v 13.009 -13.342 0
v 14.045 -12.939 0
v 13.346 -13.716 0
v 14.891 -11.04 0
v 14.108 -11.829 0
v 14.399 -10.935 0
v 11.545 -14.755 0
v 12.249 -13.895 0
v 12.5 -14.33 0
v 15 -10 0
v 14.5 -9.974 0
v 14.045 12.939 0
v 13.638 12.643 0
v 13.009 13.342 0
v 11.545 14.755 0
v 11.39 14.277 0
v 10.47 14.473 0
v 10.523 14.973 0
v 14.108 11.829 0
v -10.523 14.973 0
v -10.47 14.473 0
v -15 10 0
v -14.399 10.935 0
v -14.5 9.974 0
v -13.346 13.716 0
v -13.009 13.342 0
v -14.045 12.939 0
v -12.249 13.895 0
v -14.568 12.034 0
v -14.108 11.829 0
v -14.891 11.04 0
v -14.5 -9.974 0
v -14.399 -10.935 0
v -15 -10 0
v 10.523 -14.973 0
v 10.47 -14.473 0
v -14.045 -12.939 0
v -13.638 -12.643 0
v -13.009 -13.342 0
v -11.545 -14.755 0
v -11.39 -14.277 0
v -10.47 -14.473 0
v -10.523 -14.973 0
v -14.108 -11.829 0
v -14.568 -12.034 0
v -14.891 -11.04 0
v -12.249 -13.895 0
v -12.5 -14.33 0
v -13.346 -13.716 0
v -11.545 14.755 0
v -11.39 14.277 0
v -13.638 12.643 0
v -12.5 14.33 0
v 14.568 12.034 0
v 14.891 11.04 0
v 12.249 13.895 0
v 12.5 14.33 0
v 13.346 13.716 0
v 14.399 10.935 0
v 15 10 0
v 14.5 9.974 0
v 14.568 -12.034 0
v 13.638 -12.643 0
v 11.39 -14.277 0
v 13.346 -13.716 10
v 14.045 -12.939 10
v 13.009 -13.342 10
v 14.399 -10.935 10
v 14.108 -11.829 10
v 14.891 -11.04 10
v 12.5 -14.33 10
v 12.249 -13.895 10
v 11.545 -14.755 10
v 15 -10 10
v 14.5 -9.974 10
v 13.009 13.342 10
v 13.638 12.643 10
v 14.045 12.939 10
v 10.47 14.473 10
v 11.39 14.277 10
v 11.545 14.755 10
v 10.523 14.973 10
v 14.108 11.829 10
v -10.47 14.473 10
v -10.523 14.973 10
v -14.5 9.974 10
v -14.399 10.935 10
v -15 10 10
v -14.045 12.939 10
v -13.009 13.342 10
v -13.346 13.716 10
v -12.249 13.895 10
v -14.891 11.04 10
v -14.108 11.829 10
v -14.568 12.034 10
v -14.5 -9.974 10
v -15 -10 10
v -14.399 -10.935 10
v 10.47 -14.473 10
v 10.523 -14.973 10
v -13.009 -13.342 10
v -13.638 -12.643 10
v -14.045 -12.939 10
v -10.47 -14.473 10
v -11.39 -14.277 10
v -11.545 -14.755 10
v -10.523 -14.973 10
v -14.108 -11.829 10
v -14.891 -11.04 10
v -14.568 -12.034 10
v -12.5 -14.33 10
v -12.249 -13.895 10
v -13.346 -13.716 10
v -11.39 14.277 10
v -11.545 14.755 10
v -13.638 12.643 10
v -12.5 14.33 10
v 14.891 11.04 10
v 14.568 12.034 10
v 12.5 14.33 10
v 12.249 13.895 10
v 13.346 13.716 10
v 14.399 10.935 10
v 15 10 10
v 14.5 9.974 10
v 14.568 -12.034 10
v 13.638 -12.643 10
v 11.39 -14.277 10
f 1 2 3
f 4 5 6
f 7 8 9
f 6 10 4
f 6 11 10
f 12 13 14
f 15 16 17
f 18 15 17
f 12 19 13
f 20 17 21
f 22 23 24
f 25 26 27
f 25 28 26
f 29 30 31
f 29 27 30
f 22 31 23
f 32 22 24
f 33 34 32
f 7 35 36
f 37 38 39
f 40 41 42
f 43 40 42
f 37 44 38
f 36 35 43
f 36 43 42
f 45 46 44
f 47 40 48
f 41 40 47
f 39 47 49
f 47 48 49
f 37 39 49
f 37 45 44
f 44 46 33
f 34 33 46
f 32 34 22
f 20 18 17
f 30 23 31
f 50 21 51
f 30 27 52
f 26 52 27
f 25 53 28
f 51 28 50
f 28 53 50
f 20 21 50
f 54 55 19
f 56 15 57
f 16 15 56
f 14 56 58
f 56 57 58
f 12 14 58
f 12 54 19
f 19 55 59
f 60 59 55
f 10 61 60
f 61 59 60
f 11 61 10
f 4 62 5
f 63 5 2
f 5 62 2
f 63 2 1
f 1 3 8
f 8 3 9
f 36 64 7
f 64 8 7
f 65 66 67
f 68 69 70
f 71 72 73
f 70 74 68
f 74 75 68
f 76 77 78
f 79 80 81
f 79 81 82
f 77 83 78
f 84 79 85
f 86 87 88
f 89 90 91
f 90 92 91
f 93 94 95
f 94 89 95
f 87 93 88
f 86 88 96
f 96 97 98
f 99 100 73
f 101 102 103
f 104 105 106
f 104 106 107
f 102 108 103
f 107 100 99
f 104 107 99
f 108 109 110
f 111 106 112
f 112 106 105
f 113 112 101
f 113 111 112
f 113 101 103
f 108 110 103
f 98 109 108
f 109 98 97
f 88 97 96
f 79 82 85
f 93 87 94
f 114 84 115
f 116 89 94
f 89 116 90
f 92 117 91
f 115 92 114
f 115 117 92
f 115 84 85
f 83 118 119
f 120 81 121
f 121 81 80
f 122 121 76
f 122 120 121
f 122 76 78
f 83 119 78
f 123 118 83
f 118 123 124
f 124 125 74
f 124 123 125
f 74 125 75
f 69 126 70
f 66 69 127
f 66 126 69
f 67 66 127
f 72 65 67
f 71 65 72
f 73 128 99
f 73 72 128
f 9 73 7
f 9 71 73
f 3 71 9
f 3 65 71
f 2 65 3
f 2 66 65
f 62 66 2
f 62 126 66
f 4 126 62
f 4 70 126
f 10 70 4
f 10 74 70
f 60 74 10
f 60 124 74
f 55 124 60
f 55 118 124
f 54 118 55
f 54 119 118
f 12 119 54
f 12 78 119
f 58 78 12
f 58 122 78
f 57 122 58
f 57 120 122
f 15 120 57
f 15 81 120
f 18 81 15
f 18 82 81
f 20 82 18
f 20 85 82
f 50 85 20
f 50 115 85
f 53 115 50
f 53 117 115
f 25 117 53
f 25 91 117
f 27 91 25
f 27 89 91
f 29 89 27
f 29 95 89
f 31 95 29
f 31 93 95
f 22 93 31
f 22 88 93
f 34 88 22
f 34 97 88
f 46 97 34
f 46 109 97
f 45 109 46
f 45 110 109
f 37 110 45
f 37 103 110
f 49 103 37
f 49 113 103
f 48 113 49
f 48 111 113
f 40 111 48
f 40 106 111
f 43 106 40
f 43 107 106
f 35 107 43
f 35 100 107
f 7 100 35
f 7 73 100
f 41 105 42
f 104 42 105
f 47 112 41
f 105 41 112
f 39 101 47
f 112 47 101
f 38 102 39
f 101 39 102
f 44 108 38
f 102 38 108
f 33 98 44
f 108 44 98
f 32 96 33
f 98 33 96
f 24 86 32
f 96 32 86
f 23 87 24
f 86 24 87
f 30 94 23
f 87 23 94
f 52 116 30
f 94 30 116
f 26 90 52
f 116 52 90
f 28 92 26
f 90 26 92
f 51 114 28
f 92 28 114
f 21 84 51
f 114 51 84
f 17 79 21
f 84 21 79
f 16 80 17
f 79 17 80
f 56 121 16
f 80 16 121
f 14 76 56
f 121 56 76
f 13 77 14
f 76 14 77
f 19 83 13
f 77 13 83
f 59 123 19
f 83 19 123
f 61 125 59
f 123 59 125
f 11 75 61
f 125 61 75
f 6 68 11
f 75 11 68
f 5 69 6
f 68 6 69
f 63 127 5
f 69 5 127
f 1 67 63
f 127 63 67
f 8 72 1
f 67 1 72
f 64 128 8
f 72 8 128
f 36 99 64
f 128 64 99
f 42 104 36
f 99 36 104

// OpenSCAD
// Everything is in mm.
size = 30;
height = 10;
thickness = .5;
roundness = 5;
$fs = 0.01;
// Create a square with round edges,
// rounding may not exceed one half size.
module round_square(size_, round_) {
  half_round = round_ / 2;
  centering = (-(size_ - (round_ * 2)) / 2);
  // Centering.
  translate([centering, centering]) {
    // Rounding step.
    minkowski() {
      circle(round_, center = true);
      // Compensate for the rounding, and draw the square.
      adjusted_size = size_ - (round_ * 2);
      square([adjusted_size, adjusted_size]);
    }
  }
}

// Extrude the round wall.
linear_extrude(height) {
  difference() {
    // Create a outline of the round shape.
    round_square(size, roundness);
    // One third of thickness is used as a fudge value, to hopefully
    // make the width of the wall more consistant
    offset(-thickness){
      round_square(size, roundness);
    }
  }
}
